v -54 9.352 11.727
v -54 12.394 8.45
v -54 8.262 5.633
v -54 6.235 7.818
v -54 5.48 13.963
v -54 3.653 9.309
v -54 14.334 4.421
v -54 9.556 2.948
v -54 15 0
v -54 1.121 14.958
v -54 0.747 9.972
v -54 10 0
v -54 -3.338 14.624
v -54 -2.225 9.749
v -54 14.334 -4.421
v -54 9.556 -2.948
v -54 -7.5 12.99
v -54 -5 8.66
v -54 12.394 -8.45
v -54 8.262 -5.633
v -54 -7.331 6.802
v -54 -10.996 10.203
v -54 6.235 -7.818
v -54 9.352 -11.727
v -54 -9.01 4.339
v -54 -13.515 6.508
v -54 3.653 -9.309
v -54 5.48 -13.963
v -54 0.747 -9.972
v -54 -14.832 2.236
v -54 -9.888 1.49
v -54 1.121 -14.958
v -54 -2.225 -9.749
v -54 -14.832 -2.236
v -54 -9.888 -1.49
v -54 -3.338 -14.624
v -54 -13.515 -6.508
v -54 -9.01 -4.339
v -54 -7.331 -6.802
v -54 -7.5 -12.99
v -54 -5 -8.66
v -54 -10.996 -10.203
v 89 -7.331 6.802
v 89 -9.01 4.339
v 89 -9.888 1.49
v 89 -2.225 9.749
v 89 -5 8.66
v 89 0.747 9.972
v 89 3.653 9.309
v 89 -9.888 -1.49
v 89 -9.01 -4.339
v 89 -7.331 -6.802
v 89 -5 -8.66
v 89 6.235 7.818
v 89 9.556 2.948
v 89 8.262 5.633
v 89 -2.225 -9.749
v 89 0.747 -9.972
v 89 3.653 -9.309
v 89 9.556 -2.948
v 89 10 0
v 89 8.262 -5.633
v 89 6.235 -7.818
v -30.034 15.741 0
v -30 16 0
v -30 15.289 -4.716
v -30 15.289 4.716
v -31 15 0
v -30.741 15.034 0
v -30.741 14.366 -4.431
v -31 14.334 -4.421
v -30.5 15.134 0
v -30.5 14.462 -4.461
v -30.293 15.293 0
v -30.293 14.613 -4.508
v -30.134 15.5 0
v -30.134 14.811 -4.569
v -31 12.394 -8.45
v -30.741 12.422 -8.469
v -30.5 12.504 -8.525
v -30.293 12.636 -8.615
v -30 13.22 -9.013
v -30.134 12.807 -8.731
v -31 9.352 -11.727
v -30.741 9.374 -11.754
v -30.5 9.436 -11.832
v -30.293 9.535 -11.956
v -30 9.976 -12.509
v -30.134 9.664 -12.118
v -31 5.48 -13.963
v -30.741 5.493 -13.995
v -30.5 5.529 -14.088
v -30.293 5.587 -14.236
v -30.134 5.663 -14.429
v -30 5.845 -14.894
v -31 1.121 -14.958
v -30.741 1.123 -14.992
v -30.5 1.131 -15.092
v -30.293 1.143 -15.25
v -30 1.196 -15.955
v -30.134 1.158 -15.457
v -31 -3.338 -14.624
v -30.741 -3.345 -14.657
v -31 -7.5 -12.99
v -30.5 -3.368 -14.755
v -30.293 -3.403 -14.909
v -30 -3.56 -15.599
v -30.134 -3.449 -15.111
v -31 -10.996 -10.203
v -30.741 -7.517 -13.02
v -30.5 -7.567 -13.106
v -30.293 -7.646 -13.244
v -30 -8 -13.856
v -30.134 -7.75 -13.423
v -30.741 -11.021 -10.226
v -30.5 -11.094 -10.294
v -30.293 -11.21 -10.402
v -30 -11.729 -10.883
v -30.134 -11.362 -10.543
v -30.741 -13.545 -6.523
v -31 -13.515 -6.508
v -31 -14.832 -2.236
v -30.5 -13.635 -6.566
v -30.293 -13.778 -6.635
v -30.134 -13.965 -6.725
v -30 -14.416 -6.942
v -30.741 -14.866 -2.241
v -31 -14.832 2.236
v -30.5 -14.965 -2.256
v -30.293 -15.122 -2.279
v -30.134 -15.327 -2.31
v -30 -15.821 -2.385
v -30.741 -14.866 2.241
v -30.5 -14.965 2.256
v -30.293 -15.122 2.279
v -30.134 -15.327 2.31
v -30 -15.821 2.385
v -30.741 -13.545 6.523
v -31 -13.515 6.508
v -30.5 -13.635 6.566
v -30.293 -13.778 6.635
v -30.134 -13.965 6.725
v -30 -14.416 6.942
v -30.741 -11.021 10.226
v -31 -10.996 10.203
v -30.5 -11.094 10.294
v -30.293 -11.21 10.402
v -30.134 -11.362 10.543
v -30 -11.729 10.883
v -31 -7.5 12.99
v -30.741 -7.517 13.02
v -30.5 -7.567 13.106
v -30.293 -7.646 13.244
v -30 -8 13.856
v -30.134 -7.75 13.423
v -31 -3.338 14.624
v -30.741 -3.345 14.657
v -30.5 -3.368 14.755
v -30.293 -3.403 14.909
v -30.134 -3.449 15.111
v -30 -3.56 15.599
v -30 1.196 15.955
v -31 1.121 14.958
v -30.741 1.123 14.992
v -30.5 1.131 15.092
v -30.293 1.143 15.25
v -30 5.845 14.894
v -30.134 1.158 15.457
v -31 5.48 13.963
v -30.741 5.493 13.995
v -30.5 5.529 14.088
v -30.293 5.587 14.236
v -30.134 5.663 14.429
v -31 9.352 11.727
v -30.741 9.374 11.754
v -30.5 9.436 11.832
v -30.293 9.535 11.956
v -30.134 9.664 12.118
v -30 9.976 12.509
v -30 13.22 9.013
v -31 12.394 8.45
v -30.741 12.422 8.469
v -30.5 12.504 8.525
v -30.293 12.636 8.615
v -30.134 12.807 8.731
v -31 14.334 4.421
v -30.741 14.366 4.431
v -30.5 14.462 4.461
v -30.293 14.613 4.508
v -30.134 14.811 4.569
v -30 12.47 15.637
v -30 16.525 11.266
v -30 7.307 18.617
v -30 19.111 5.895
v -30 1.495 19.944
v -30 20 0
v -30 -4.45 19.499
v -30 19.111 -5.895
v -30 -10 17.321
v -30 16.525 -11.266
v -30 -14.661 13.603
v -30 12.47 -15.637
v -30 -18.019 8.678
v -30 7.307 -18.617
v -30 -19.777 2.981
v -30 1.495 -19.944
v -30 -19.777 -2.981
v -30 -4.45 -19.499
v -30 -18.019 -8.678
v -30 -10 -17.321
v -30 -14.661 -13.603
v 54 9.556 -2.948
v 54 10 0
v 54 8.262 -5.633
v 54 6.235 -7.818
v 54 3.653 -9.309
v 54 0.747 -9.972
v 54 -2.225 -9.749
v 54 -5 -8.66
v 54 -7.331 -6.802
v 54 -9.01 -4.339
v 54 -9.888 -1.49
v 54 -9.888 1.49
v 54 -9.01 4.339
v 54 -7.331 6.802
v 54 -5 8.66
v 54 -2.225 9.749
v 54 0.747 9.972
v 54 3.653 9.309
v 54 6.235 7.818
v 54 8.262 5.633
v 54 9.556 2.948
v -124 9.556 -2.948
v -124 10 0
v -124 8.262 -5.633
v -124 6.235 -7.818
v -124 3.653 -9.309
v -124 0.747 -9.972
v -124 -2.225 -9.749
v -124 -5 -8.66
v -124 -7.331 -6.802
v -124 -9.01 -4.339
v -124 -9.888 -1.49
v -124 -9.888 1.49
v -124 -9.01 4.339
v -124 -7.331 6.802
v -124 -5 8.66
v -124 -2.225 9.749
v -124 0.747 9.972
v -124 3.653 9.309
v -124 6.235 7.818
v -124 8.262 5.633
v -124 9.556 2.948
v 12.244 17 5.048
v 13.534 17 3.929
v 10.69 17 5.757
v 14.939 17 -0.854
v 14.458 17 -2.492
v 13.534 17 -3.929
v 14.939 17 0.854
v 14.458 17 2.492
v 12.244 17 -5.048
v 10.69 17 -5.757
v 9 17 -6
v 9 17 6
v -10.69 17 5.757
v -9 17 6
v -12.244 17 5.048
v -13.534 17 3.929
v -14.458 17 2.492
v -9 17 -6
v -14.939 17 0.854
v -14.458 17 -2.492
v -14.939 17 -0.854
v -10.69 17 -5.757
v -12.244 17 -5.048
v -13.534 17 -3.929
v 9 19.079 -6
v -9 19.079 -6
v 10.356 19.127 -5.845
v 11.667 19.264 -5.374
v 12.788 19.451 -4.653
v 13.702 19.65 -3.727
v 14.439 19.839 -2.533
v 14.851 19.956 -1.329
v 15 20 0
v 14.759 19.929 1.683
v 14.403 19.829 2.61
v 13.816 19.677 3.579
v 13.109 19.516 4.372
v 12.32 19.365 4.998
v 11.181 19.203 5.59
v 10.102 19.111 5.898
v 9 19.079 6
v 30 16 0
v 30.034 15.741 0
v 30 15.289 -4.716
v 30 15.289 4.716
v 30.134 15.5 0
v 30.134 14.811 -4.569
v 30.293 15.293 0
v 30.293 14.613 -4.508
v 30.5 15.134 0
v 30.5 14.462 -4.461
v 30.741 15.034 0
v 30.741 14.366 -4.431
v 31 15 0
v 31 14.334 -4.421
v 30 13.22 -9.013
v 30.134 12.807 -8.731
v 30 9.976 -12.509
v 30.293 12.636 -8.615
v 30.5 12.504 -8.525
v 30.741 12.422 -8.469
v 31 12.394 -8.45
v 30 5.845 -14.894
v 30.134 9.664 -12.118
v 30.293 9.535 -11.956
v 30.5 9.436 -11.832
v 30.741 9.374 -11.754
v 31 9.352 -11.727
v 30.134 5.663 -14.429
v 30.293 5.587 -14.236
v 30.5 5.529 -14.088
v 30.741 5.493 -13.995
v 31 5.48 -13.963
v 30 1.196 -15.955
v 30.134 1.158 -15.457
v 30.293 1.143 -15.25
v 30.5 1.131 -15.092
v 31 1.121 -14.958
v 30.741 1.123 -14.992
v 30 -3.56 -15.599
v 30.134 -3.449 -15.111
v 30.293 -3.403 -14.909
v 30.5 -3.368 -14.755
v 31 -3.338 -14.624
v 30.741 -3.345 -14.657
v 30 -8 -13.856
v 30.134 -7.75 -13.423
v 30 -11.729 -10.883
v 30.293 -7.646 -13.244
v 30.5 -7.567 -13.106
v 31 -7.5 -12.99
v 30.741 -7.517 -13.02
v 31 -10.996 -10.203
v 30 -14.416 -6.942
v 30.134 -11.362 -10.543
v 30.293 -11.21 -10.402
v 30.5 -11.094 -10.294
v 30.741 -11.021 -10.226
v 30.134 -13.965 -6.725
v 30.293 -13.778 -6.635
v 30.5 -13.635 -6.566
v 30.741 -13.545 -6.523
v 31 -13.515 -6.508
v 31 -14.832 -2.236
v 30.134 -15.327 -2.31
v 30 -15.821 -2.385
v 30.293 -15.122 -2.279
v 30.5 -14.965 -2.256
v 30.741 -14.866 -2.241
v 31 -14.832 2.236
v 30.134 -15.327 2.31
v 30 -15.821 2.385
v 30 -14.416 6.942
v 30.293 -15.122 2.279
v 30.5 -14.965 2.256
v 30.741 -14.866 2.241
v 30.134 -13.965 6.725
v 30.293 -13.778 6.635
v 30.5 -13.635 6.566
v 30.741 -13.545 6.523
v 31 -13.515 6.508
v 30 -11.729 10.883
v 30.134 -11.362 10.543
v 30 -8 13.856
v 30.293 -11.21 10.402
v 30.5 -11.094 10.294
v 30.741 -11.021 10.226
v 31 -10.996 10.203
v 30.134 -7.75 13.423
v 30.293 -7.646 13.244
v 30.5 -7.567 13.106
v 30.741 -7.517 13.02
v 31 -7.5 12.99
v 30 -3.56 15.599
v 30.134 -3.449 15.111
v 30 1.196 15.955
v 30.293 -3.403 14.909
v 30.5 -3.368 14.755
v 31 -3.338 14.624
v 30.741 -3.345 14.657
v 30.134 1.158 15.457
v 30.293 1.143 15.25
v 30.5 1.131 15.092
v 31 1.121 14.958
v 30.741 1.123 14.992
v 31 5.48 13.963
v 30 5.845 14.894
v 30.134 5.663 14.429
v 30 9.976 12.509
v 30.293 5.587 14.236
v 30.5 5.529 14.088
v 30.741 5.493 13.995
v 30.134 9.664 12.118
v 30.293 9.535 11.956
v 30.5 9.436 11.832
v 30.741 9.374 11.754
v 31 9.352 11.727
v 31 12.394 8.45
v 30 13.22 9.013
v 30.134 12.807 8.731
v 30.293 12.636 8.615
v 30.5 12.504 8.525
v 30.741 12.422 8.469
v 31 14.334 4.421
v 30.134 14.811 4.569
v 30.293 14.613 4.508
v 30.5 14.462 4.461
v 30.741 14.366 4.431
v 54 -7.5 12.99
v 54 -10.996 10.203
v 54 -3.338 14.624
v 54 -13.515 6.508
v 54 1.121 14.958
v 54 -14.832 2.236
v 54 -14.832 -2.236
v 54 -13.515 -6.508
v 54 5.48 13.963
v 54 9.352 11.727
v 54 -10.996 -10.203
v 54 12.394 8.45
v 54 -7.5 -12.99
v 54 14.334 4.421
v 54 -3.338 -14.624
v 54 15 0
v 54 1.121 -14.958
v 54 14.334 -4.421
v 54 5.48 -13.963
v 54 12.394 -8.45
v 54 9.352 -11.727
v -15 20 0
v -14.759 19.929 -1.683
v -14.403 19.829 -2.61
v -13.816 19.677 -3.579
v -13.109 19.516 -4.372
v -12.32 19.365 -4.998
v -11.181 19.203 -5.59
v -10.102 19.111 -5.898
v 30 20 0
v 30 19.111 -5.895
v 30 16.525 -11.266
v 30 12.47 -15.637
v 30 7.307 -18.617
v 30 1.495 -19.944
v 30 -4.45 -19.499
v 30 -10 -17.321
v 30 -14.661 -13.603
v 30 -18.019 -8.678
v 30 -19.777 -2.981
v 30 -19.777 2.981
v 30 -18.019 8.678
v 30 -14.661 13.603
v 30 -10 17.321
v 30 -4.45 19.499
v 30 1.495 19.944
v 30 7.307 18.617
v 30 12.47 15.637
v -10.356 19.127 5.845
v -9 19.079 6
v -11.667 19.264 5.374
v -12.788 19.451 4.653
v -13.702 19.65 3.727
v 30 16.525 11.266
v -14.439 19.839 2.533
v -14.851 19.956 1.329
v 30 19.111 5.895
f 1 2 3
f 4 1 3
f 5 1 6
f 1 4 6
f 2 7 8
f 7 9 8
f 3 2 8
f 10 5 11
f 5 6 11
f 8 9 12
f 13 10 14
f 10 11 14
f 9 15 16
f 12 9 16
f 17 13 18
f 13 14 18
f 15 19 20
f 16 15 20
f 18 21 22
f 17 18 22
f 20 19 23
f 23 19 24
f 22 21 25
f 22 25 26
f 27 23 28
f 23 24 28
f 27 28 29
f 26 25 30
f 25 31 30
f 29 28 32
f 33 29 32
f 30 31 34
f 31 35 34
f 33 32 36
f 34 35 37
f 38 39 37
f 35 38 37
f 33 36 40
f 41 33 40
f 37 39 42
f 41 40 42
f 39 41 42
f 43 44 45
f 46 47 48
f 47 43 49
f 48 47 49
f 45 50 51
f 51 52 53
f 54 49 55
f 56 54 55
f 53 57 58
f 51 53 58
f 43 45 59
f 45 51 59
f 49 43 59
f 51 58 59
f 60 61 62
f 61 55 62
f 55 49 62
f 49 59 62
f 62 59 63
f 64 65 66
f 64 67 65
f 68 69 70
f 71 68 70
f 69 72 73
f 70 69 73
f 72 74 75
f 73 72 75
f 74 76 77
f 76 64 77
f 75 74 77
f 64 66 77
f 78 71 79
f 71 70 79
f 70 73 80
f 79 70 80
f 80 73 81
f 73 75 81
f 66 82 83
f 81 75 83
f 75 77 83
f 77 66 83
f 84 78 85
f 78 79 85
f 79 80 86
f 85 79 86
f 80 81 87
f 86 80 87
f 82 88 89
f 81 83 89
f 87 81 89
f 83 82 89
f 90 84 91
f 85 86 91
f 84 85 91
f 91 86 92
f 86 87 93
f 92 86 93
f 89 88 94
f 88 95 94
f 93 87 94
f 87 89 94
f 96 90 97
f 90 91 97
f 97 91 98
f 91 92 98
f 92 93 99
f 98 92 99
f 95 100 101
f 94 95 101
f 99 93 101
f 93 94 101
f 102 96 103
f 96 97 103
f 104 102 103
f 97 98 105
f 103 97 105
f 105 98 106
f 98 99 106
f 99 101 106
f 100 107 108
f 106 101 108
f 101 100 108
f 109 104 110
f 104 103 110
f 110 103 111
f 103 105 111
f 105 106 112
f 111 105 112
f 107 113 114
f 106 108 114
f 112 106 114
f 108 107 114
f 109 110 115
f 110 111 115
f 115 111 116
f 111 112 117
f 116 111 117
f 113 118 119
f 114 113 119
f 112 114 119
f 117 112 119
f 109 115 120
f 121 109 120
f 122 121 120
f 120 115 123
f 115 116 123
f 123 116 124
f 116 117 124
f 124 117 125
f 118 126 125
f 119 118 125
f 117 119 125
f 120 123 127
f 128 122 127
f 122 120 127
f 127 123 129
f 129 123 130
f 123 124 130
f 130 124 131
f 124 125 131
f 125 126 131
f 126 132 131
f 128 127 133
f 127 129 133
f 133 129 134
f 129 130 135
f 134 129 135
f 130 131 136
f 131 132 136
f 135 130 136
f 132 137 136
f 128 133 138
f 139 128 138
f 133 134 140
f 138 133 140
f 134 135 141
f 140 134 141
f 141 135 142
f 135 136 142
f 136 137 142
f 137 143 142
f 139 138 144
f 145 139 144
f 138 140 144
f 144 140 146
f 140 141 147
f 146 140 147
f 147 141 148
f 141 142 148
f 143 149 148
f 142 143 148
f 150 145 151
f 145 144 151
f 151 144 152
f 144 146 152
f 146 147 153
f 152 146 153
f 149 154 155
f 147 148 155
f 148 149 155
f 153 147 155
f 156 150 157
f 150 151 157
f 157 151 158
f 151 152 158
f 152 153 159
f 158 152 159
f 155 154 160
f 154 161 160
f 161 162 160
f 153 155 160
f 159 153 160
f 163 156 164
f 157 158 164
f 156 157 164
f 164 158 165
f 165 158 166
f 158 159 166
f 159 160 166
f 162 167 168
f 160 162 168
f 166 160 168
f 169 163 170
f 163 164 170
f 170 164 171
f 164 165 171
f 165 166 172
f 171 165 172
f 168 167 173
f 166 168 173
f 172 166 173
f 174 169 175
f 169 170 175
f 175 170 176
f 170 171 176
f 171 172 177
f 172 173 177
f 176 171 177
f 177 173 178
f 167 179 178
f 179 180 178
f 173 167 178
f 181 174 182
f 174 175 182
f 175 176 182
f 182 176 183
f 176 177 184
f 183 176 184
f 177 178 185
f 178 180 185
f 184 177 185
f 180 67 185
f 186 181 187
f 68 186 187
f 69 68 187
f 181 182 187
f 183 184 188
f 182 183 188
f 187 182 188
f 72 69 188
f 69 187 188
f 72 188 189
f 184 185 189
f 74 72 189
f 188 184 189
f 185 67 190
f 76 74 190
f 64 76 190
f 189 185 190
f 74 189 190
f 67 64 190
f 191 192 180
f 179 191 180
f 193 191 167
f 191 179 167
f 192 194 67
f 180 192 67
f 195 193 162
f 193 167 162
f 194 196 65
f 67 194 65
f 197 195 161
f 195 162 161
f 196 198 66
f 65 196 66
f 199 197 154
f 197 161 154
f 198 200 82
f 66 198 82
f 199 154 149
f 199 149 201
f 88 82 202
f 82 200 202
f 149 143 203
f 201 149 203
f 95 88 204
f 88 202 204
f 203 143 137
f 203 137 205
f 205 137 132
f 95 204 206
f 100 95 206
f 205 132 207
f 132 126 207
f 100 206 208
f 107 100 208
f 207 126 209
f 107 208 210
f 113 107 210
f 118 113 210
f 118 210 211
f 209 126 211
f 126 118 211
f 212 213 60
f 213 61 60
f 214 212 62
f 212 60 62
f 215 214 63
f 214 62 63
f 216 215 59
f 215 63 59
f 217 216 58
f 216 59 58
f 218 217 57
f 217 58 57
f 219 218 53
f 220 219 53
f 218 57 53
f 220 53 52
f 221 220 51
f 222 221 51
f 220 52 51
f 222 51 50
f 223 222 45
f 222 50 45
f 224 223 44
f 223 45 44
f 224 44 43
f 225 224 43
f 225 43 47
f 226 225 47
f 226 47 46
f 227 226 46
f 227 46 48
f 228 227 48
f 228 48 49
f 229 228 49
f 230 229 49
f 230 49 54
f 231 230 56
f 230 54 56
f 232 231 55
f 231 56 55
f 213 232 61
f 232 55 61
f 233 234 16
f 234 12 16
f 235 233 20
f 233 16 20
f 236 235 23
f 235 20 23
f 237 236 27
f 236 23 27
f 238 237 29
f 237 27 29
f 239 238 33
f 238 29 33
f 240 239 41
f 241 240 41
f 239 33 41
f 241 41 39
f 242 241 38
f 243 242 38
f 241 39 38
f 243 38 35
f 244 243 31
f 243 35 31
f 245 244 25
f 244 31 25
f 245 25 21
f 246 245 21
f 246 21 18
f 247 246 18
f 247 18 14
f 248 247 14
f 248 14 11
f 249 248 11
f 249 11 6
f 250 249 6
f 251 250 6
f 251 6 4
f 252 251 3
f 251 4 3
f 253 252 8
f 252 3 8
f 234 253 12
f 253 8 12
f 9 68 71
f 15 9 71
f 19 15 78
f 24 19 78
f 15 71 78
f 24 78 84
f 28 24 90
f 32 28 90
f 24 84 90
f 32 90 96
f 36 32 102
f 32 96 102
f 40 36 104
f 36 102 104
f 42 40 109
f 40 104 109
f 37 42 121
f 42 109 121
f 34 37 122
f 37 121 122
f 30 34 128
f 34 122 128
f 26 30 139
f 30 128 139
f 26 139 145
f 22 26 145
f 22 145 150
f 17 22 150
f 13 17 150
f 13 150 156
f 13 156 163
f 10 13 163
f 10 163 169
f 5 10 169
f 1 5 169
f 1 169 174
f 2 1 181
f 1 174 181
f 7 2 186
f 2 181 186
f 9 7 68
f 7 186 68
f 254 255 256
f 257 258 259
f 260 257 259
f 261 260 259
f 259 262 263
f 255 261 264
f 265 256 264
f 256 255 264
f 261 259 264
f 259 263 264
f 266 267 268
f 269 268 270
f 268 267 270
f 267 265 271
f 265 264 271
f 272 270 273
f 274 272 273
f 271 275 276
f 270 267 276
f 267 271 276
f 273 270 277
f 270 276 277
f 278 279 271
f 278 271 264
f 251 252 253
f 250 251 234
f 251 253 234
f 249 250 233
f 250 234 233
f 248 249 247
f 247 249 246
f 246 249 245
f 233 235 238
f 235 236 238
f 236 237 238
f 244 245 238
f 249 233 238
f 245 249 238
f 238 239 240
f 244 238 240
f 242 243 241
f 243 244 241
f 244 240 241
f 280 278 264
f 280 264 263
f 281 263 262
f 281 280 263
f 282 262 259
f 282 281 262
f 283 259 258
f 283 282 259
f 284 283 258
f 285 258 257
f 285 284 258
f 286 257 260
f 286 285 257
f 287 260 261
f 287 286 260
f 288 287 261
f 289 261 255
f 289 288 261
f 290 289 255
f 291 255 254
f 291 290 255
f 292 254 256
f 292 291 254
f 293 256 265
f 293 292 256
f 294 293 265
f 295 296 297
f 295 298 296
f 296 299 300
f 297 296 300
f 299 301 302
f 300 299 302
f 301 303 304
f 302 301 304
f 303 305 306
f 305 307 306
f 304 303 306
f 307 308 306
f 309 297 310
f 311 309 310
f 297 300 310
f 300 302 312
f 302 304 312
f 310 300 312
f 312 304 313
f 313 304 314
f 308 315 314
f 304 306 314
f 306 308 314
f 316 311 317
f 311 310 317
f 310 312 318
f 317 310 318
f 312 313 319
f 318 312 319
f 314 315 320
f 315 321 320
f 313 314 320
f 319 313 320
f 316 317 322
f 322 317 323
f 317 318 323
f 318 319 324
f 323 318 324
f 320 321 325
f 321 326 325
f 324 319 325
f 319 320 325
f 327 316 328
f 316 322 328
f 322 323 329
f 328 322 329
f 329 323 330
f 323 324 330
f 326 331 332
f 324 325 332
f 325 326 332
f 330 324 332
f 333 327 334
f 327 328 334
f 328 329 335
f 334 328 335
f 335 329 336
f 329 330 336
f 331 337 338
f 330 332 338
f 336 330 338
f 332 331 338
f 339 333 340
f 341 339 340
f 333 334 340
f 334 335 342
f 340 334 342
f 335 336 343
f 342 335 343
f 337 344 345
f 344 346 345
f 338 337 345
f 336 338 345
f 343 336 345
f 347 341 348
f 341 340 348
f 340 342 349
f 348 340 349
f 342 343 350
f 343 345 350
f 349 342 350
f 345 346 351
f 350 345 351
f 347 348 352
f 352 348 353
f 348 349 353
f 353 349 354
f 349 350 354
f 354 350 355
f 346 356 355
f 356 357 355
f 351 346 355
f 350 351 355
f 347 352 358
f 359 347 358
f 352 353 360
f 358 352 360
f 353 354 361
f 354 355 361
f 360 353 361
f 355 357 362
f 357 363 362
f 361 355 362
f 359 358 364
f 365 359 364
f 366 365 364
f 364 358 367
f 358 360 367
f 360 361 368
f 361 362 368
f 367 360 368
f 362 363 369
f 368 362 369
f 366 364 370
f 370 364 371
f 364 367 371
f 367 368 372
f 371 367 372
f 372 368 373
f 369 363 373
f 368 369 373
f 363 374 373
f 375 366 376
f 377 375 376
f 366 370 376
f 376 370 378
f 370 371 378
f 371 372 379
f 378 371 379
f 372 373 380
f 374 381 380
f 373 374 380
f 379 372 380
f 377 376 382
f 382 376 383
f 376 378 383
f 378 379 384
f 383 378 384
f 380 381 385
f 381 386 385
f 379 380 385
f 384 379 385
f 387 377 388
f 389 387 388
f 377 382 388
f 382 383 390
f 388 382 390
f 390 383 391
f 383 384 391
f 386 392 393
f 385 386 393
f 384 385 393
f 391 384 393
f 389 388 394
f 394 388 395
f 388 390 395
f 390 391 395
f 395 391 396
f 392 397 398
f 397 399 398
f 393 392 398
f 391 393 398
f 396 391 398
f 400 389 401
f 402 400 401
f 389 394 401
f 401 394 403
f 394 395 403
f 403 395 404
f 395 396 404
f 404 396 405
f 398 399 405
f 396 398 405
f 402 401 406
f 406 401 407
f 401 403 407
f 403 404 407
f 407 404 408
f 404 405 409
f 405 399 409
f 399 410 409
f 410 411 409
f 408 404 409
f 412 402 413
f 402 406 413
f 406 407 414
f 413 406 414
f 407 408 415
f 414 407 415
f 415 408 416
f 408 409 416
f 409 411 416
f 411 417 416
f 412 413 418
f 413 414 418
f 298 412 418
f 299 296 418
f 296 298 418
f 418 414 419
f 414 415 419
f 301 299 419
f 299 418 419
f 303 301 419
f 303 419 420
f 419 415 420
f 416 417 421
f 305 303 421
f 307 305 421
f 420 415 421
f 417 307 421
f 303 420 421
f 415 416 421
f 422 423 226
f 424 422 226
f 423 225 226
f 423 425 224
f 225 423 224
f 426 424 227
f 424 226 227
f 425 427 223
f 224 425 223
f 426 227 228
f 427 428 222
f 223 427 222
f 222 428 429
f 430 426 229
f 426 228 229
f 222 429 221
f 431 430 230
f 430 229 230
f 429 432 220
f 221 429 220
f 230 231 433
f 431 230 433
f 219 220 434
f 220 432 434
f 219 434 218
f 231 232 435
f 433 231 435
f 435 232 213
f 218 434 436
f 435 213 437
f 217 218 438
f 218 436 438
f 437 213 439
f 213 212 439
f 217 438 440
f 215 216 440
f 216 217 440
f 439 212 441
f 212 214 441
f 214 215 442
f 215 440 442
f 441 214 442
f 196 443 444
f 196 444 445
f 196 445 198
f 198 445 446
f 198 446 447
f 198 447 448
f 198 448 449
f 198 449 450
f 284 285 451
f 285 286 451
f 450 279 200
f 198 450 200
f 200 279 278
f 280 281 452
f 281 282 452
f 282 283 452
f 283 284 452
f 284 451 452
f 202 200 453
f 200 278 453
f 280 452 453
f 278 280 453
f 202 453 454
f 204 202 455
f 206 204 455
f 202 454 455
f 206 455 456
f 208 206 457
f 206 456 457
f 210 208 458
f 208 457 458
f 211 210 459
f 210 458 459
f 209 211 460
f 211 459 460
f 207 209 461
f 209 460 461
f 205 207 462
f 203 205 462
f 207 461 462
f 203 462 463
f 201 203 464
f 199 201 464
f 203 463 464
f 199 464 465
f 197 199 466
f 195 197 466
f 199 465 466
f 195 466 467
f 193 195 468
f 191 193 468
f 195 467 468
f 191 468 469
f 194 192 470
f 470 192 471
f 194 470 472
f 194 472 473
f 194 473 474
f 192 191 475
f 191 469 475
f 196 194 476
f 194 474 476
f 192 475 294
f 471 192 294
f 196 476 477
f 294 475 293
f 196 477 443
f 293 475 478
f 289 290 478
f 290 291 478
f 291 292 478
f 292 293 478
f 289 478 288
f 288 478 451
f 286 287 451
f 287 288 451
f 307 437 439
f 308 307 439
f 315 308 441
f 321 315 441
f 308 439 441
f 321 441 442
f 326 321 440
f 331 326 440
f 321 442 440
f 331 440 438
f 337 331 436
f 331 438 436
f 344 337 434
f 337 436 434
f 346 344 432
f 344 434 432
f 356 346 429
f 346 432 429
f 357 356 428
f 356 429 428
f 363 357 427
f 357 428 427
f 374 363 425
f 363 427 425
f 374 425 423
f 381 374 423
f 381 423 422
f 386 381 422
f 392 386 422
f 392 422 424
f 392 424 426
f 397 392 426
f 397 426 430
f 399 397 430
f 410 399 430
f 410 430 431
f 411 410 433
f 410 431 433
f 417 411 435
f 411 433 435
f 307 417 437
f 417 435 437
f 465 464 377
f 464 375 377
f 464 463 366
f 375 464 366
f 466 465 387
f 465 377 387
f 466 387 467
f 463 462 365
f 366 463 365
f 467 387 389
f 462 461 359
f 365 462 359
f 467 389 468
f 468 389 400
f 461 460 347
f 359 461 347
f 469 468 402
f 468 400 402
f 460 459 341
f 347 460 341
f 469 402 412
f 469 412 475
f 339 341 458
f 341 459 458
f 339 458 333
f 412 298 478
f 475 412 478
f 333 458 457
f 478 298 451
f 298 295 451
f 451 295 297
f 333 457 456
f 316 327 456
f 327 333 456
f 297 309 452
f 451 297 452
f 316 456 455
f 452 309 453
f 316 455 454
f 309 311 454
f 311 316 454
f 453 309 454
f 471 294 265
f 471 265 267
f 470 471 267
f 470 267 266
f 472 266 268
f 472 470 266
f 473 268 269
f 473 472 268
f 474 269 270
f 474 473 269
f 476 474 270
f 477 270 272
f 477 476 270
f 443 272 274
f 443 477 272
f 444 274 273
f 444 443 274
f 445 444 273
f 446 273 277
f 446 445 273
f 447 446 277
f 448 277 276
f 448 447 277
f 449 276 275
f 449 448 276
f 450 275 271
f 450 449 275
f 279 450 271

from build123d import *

# Parameters (mm, degrees)
FILLET1_R          = 1
CUT_EXTRUDE1_DEPTH = 3


with BuildPart() as part:
    # Sketch1 → Revolve2 (revolve)
    with BuildSketch(Plane.XY):
        Polygon((-124, 0), (-124, 10), (-54, 10), (-54, 15), (-30, 15), (-30, 20), (30, 20), (30, 15), (54, 15), (54, 10), (89, 10), (89, 0), align=None)
    revolve(axis=Axis((89, 0, 0), (-1, 0, 0)))

    # Fillet1
    fillet1_edges = [part.edges().sort_by_distance(p)[0] for p in [
        (30, -15, 0),
        (-30, -15, 0),
    ]]
    fillet(fillet1_edges, radius=FILLET1_R)

    # Sketch2 → Cut-Extrude1 (cut)
    with BuildSketch(Plane(origin=(0, 20, 0), x_dir=(1, 0, 0), z_dir=(0, 1, 0))):
        with BuildLine():
            Line((9, -6), (-9, -6))
            ThreePointArc((-9, -6), (-15, 0), (-9, 6))
            Line((-9, 6), (9, 6))
            ThreePointArc((9, 6), (15, 0), (9, -6))
        make_face()
    extrude(amount=-CUT_EXTRUDE1_DEPTH, mode=Mode.SUBTRACT)


solid = part.part
